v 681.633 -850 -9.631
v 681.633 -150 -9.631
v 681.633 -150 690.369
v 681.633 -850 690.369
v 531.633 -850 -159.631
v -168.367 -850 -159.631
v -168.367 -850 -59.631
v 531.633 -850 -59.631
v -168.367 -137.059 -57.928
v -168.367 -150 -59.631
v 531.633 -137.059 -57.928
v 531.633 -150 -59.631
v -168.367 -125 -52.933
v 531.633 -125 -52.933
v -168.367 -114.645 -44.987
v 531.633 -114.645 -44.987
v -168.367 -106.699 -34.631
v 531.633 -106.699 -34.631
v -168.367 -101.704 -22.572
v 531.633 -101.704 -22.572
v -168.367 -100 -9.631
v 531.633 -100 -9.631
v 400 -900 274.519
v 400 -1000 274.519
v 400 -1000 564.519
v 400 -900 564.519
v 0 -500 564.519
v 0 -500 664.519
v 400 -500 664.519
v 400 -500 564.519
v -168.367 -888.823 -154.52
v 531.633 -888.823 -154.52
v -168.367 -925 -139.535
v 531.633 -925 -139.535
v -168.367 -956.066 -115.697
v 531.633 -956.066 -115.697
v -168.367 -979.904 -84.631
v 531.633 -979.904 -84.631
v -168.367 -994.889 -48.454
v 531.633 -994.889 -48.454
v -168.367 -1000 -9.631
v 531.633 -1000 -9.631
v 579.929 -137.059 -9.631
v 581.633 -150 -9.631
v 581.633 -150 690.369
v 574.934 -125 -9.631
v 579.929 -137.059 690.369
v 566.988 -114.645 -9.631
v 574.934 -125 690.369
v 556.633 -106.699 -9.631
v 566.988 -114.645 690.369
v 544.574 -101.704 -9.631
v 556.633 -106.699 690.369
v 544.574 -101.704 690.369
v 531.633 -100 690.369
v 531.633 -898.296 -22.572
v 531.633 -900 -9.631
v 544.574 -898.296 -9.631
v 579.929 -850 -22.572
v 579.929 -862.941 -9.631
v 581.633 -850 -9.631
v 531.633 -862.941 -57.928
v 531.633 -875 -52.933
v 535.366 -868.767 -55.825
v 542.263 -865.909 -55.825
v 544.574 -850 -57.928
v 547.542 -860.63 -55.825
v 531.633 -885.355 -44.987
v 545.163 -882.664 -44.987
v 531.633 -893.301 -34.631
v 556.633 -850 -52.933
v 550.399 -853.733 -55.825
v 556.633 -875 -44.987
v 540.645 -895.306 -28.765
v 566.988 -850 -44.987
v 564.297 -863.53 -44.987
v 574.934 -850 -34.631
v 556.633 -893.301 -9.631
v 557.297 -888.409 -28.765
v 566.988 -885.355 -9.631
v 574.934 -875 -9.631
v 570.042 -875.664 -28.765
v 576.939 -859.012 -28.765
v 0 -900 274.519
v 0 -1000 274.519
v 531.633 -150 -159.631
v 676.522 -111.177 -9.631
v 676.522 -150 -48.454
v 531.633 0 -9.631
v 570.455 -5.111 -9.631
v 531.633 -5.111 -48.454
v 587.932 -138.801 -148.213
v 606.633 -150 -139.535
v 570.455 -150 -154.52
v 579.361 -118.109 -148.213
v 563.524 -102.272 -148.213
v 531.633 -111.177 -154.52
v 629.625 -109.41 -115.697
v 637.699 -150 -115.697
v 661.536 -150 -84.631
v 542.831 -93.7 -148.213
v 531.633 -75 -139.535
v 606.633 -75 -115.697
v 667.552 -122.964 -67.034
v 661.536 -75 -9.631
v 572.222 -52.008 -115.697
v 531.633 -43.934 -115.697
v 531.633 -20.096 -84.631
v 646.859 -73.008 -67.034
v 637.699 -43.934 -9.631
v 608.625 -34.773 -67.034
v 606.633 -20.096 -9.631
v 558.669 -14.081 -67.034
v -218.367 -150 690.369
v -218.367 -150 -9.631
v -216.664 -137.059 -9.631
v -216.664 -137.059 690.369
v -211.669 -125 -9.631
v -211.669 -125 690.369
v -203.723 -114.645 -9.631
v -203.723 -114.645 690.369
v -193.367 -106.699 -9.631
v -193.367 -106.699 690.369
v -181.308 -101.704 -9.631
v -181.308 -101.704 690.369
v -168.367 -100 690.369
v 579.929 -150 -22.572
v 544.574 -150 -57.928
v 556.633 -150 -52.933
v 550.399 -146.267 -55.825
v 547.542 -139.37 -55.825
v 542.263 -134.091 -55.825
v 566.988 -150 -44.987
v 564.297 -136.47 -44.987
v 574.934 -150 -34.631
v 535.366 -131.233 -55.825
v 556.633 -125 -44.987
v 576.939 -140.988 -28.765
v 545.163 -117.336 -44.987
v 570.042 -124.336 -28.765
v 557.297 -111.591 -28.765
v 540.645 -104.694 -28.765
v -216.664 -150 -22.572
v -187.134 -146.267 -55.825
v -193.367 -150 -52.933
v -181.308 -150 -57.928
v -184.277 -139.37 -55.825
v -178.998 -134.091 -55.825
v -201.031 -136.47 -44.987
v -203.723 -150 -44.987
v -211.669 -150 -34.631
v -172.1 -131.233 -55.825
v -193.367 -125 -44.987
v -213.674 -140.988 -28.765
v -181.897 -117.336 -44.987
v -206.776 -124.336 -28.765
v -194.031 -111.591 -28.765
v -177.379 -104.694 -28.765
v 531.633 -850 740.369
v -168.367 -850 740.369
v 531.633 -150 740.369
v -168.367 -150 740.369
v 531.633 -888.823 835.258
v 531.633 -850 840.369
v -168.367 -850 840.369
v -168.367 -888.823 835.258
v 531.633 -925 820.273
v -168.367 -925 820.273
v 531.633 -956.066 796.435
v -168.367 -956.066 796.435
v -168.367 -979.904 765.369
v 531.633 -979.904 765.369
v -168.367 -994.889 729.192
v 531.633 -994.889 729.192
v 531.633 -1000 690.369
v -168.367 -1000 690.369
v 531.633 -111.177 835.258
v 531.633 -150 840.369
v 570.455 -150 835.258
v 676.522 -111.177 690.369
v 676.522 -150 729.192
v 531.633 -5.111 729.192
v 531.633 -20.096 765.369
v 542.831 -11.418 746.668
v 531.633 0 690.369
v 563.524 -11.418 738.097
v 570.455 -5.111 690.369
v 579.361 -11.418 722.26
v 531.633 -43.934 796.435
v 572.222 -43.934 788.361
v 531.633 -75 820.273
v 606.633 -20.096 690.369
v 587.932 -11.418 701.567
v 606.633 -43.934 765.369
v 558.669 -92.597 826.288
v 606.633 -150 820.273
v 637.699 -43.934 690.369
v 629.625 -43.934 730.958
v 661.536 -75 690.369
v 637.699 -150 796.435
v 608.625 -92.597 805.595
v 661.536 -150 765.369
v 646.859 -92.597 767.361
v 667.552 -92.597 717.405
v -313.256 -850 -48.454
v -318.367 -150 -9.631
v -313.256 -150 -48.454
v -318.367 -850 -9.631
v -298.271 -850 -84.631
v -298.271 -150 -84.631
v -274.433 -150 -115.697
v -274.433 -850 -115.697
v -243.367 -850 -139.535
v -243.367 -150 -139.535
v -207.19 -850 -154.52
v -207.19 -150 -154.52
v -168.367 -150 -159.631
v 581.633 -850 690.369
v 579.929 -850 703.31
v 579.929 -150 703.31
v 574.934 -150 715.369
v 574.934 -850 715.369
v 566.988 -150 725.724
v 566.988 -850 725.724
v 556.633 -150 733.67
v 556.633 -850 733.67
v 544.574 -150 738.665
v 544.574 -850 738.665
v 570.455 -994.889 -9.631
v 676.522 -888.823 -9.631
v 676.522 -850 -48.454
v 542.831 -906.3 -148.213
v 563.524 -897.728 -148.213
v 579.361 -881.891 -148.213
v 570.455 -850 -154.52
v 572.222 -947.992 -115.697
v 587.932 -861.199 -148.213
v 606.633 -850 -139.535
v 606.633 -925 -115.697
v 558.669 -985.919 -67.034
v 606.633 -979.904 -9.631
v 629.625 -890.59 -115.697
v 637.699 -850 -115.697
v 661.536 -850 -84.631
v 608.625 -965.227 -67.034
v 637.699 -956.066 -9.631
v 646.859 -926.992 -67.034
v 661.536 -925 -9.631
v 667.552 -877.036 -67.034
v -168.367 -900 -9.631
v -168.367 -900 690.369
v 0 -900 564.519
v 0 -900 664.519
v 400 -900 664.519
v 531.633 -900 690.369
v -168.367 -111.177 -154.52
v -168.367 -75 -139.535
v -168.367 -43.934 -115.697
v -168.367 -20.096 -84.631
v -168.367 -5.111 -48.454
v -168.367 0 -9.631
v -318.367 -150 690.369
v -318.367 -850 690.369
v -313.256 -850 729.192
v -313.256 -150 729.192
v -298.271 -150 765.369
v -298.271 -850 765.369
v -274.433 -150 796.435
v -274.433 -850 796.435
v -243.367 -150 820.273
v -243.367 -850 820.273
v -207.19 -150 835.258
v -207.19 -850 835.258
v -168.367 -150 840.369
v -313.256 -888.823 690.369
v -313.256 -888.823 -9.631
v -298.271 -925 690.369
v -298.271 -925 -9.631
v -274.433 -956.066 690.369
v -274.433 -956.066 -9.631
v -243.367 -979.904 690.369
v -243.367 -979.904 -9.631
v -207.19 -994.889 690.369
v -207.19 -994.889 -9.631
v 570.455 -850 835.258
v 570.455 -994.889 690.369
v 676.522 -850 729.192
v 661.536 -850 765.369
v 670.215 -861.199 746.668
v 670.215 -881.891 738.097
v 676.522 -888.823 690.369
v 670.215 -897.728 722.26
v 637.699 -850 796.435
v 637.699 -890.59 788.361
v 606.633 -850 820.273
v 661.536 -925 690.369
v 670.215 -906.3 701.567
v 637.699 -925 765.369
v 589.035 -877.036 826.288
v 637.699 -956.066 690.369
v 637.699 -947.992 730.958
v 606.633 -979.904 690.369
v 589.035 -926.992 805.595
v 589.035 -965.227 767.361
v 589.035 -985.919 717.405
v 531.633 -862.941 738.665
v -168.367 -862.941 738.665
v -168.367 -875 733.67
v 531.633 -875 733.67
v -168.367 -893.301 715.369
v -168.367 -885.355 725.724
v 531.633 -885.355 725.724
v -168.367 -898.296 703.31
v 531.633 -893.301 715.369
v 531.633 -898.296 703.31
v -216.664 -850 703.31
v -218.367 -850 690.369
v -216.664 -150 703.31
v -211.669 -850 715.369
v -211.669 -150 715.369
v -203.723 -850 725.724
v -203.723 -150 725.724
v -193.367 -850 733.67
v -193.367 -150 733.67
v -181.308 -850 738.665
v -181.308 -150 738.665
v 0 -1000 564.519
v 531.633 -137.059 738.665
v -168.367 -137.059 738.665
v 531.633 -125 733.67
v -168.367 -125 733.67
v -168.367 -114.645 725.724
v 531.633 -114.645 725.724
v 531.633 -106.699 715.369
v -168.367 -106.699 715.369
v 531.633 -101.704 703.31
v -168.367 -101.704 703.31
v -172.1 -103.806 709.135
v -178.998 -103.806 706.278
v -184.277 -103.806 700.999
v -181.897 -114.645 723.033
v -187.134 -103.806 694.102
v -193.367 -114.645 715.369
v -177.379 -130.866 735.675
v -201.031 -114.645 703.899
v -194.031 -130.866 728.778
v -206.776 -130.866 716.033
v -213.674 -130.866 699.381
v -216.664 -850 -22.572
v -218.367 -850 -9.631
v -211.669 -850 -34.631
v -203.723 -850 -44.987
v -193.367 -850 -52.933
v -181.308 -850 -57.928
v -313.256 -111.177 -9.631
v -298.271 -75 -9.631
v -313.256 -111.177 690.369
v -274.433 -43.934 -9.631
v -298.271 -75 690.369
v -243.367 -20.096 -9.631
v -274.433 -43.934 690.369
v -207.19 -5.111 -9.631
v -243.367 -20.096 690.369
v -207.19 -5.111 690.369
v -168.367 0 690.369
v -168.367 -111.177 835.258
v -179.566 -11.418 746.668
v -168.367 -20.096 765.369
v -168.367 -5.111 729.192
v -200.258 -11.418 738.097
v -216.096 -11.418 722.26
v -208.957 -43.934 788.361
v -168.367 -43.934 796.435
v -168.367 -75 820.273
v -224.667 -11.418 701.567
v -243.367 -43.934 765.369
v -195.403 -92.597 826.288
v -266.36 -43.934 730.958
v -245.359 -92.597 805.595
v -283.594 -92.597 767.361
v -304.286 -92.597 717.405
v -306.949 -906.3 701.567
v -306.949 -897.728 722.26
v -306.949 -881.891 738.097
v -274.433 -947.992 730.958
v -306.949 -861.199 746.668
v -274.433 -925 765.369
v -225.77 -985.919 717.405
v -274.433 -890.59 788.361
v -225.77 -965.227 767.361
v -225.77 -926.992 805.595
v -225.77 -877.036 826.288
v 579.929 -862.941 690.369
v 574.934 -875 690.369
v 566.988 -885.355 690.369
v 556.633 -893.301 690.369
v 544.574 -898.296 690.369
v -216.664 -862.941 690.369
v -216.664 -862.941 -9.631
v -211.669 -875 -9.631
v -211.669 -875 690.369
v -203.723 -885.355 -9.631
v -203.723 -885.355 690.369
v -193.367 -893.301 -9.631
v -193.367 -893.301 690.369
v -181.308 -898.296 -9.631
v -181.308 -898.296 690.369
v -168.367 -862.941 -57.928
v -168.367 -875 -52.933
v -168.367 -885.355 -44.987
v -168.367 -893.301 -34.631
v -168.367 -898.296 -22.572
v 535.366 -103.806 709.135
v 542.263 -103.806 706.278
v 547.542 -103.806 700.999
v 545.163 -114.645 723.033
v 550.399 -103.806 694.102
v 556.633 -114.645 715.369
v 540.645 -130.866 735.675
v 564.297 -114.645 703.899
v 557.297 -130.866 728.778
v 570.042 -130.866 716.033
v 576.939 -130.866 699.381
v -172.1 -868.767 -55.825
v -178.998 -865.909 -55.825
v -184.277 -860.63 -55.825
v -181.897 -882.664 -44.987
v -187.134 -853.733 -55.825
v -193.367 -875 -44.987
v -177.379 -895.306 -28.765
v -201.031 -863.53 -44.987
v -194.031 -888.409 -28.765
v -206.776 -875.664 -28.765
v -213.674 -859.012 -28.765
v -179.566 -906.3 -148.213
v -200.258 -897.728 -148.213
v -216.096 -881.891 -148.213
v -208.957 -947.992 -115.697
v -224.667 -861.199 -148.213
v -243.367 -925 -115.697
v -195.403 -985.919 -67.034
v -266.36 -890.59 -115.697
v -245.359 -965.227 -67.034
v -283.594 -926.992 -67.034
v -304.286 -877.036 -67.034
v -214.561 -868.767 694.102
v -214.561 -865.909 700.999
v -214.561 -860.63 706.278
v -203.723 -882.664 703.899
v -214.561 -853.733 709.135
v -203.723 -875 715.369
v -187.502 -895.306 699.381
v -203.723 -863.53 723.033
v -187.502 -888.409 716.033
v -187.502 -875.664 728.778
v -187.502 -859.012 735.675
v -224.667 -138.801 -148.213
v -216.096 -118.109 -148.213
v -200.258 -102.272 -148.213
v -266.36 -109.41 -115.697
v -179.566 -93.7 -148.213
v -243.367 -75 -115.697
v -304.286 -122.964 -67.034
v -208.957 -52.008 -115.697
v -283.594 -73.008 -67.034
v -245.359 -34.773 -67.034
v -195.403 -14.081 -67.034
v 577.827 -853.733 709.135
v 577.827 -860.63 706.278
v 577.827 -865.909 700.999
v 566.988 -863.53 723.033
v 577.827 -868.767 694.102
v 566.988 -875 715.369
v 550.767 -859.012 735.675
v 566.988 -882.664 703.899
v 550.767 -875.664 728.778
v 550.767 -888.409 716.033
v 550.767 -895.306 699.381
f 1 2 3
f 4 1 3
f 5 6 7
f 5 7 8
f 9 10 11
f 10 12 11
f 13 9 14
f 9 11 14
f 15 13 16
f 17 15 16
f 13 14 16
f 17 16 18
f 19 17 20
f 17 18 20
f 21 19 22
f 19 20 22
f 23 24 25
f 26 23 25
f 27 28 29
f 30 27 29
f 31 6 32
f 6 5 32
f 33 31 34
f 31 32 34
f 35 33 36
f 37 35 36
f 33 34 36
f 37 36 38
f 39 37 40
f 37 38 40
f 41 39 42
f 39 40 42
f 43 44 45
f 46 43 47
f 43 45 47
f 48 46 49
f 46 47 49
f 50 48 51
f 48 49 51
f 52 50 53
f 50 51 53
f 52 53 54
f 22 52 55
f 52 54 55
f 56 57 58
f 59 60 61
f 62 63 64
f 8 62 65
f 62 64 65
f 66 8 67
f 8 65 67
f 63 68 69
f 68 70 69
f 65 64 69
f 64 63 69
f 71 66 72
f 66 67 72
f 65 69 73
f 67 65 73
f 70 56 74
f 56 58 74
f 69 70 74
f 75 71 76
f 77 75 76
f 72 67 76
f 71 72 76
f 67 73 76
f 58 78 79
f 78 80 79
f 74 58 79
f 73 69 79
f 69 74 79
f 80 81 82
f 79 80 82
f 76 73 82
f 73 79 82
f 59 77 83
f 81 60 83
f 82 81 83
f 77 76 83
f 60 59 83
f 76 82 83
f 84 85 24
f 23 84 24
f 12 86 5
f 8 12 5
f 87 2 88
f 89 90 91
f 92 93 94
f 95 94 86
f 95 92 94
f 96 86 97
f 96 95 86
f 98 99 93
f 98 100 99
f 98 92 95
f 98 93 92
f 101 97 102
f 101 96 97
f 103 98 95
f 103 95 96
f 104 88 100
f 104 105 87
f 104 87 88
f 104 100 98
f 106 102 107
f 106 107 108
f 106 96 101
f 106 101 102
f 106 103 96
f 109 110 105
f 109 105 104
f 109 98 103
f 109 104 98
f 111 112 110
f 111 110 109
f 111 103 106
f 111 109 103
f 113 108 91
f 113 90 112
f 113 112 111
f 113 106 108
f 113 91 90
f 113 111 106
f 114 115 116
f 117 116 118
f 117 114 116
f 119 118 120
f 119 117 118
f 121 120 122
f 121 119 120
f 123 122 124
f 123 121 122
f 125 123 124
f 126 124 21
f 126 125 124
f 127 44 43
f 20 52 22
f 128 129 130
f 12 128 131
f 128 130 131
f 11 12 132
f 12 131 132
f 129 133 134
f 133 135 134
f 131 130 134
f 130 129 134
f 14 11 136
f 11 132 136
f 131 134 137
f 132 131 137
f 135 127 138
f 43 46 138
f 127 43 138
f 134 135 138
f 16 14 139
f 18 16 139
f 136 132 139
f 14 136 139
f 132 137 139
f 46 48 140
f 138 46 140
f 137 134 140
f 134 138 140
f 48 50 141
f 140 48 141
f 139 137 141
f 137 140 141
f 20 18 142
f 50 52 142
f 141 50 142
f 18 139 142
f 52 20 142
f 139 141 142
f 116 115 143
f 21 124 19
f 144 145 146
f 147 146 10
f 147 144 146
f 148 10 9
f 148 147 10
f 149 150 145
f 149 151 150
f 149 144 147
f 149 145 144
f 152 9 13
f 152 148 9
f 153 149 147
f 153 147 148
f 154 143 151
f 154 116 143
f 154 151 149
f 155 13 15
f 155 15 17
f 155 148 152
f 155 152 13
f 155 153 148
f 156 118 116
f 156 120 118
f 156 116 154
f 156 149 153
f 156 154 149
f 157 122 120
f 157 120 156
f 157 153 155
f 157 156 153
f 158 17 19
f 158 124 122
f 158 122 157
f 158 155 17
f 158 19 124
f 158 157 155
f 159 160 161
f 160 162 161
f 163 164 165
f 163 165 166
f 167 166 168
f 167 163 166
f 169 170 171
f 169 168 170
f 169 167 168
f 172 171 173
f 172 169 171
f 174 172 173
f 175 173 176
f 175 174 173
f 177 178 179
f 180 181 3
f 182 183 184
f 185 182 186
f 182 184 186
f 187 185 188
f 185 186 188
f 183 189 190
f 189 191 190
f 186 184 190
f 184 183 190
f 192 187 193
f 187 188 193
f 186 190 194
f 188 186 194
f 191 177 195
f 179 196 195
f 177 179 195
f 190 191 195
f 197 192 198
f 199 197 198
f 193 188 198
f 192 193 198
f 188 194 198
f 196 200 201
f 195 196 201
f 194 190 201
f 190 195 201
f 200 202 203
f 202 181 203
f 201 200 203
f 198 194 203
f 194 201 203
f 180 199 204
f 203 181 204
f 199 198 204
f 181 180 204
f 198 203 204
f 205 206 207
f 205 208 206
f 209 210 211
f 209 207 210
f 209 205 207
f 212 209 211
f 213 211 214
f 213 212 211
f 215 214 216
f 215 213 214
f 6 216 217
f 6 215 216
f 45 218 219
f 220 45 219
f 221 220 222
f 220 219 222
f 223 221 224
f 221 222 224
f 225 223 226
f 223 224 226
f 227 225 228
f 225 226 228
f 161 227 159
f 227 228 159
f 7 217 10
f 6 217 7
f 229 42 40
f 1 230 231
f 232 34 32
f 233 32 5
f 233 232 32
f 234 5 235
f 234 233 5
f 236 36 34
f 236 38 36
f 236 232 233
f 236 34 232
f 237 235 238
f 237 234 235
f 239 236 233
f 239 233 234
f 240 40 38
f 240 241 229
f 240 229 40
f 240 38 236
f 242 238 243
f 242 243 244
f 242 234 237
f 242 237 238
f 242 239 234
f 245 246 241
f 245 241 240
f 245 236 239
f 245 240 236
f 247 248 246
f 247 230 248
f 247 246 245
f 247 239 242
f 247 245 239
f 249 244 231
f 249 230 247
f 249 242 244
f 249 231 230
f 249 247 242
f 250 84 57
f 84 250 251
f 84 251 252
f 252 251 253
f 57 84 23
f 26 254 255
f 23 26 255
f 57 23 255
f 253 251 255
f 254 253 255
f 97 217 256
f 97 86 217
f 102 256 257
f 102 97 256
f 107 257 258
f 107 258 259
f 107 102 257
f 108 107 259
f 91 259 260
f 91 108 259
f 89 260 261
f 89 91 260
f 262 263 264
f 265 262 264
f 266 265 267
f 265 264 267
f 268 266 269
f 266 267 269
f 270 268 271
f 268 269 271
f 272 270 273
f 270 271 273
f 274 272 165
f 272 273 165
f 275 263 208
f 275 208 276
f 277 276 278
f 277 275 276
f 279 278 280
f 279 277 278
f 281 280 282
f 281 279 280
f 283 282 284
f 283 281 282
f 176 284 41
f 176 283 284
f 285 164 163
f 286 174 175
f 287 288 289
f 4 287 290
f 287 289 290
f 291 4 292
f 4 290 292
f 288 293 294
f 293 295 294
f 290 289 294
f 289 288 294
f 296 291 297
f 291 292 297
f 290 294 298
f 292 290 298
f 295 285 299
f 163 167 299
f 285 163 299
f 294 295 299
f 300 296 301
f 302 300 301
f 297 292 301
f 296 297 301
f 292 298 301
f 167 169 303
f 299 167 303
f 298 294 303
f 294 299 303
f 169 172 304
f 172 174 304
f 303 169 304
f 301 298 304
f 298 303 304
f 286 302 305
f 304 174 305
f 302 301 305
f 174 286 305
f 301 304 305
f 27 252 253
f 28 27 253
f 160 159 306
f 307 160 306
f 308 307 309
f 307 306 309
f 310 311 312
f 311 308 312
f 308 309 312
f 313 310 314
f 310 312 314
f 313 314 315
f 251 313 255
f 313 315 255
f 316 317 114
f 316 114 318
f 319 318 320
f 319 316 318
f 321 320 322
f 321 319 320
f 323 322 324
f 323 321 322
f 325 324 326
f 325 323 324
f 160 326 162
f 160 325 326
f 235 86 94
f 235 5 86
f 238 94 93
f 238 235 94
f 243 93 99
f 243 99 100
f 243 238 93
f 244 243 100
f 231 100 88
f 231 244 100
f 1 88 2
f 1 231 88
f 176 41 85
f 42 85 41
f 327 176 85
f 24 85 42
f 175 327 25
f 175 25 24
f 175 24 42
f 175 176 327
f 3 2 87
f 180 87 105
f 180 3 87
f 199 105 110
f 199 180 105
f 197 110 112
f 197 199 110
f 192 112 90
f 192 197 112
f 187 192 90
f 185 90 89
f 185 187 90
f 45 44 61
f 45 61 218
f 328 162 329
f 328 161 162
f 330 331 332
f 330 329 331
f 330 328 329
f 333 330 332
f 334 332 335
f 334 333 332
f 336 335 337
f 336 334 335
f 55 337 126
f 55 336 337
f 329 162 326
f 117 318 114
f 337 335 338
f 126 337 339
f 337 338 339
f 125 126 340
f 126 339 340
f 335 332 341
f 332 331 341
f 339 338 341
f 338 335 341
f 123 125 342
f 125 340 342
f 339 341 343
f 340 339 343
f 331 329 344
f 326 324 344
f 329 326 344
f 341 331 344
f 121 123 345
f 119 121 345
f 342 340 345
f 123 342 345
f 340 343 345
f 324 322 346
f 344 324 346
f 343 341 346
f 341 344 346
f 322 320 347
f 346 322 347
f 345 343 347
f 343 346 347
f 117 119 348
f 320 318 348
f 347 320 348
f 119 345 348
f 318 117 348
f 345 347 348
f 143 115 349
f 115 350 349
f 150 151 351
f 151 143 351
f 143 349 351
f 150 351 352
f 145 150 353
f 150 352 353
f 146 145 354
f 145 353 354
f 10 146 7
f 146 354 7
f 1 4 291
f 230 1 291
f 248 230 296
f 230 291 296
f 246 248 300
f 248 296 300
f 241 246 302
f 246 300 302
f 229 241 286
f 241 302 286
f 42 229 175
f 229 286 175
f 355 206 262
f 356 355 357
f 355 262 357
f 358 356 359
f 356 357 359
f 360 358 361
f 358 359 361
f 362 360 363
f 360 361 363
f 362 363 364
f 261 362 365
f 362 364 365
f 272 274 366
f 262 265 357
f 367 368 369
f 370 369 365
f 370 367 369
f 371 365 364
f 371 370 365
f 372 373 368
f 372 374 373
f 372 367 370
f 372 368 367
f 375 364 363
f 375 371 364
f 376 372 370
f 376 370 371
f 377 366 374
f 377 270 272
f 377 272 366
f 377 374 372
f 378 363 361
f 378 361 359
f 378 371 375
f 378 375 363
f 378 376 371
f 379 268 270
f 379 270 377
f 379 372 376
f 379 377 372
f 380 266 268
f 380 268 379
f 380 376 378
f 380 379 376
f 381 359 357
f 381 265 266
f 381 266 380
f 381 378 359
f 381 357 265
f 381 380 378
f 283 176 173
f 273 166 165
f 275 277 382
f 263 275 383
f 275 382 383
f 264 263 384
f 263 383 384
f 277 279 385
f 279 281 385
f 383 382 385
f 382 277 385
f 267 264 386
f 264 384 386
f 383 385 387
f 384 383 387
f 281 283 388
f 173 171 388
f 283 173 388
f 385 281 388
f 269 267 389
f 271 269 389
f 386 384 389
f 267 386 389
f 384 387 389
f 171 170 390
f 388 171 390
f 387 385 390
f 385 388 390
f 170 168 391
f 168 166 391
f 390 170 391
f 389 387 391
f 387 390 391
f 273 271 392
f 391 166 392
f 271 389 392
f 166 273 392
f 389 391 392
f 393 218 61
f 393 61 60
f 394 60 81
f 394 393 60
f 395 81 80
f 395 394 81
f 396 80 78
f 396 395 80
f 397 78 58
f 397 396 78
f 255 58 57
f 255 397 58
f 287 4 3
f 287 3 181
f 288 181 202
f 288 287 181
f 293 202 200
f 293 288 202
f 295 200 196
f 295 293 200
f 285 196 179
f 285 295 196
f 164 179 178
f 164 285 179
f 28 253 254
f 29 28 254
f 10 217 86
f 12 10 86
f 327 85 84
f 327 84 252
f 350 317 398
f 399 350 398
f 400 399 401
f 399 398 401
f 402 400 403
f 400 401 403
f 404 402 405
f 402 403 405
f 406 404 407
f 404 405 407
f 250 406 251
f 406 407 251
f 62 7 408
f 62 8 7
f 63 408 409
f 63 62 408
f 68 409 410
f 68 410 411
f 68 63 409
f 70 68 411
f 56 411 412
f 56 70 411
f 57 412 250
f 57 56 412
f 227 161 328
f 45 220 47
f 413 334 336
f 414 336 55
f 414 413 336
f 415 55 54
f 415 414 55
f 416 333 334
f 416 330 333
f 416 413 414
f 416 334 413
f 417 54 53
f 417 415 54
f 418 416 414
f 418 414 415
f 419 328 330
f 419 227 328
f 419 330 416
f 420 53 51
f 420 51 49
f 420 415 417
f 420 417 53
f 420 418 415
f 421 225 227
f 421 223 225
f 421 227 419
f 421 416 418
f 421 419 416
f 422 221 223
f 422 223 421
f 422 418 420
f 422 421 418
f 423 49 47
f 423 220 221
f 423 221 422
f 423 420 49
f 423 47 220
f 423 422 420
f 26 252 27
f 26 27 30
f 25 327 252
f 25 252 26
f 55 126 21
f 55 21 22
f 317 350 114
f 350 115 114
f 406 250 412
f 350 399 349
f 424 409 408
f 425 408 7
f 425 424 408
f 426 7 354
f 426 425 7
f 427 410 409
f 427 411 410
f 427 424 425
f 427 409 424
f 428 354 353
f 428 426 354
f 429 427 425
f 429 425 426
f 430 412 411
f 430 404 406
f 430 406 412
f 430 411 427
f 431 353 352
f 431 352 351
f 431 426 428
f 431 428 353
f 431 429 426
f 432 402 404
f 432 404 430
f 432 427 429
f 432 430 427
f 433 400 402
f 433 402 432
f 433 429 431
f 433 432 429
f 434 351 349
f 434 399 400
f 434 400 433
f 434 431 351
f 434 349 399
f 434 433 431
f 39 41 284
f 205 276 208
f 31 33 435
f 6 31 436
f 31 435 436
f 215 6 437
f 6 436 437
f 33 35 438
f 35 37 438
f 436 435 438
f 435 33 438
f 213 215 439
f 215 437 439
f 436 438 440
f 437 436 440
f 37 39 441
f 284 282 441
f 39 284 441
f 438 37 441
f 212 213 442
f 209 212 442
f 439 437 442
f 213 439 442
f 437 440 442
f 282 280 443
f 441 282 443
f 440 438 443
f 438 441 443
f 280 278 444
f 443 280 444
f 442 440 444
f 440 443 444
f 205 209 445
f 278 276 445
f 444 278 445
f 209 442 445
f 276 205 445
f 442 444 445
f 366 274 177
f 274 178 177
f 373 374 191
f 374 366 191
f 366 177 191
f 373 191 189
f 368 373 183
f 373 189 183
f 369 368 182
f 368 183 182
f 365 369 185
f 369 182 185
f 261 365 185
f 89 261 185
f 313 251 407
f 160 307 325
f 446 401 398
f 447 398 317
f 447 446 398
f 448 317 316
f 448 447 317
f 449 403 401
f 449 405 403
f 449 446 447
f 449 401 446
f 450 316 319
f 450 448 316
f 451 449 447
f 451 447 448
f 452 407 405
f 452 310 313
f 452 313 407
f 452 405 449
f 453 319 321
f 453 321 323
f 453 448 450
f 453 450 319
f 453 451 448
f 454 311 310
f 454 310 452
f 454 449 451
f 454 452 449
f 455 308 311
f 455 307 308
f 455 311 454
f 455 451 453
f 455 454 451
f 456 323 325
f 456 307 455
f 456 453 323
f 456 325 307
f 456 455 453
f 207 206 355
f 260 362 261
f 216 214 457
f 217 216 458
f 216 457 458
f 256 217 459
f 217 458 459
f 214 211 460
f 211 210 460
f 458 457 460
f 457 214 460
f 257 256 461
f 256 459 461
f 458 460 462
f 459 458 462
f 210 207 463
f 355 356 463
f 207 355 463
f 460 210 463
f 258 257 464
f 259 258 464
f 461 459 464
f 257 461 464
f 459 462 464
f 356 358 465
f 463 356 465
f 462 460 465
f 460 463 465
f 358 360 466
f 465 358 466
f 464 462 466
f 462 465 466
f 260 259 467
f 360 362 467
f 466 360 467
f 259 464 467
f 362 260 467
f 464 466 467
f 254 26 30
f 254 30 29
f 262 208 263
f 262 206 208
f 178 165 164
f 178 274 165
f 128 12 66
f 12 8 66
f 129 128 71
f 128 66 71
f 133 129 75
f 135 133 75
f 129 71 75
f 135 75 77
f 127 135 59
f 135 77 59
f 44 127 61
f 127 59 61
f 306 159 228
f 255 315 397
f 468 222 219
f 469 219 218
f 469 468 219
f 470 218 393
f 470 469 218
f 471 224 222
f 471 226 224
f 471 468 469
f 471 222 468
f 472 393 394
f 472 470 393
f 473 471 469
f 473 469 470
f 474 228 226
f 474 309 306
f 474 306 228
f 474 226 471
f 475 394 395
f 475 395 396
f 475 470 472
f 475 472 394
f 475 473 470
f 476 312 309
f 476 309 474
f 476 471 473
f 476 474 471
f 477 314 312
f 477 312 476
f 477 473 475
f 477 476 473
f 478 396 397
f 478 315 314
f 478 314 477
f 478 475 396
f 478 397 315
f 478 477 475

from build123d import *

# Parameters (mm, degrees)
F0_W     = 1000
F0_H     = 1000
F1_DEPTH = 1000
F2_R     = 150
F3_W     = 400
F3_H     = 290
F4_DEPTH = 500
F5_T     = 100
F6_W     = 700
F6_H     = 700
F7_DEPTH = 500


# Not quite as in the source:
# - a shell that OpenCascade refuses in one call is made with other operations: the cavity is built on its own and cut out


with BuildPart() as f1:
    # F0 (on Front) → F1 (new body)
    with BuildSketch(Plane.XZ):
        with Locations((181.6326389278, 340.3687052429)):
            Rectangle(F0_W, F0_H)
    extrude(amount=F1_DEPTH)

    # F2
    f2_edges = [f1.edges().sort_by_distance(p)[0] for p in [
        (181.632639, -1000, 840.368705),
        (681.632639, -500, 840.368705),
        (681.632639, -1000, 340.368705),
        (-318.367361, -1000, 340.368705),
        (-318.367361, -500, 840.368705),
        (181.632639, 0, 840.368705),
        (681.632639, 0, 340.368705),
        (-318.367361, 0, 340.368705),
        (181.632639, -1000, -159.631295),
        (681.632639, -500, -159.631295),
        (-318.367361, -500, -159.631295),
        (181.632639, 0, -159.631295),
    ]]
    fillet(f2_edges, radius=F2_R)

    # F3 (on face) → F4 (cut)
    with BuildSketch(Plane.XZ.offset(1000)):
        with Locations((200, 419.5188772678)):
            Rectangle(F3_W, F3_H)
    extrude(amount=-F4_DEPTH, mode=Mode.SUBTRACT)

    # F5: shell of thickness 100, made by hand


with BuildPart() as f5_core1:
    # F5_t2: copy of F1
    add(f1.part)

    # the walls: a layer under each face that stays
    f5_faces = [f5_core1.faces().sort_by_distance(p)[0] for p in [
        (-318.3673610722, -500, 340.3687052429),
        (-274.4333782502, -956.066017178, 340.3687052429),
        (-274.4333782502, -500, 796.4347224209),
        (-274.4333782502, -500, -115.6973119351),
        (-274.4333782502, -43.933982822, 340.3687052429),
        (-274.4333782502, -925, 765.3687052429),
        (-51.7006944055, -1000, 107.0353719095),
        (-243.3673610722, -925, -115.6973119351),
        (-243.3673610722, -43.933982822, 765.3687052429),
        (181.6326389278, -500, 840.3687052429),
        (-243.3673610722, -75, -115.6973119351),
        (181.6326389278, -500, -159.6312947571),
        (181.6326389278, 0, 340.3687052429),
        (181.6326389278, -956.066017178, 796.4347224209),
        (637.6986561058, -956.066017178, 340.3687052429),
        (181.6326389278, -956.066017178, -115.6973119351),
        (200, -750, 564.5188772678),
        (181.6326389278, -43.933982822, 796.4347224209),
        (637.6986561058, -500, 796.4347224209),
        (181.6326389278, -43.933982822, -115.6973119351),
        (637.6986561058, -500, -115.6973119351),
        (637.6986561058, -43.933982822, 340.3687052429),
        (637.6986561058, -925, 765.3687052429),
        (681.6326389278, -500, 340.3687052429),
        (606.6326389278, -925, -115.6973119351),
        (606.6326389278, -43.933982822, 765.3687052429),
        (606.6326389278, -75, -115.6973119351),
    ]]
    thicken(f5_faces, amount=-F5_T, mode=Mode.SUBTRACT)


with BuildPart() as f1_1:
    add(f1.part)

    # what is left inside the walls is the cavity
    f5_cavity = [f5_core1.part.solids().sort_by_distance(p)[0] for p in [
        (181.632639, -101, 223.702039),
    ]]
    add(f5_cavity, mode=Mode.SUBTRACT)

    # F6 (on face) → F7 (cut)
    with BuildSketch(Plane(origin=(0, 0, -159.6312947571), x_dir=(1, 0, 0), z_dir=(0, 0, -1))):
        with Locations((181.6326389278, 500)):
            Rectangle(F6_W, F6_H)
    extrude(amount=-F7_DEPTH, mode=Mode.SUBTRACT)


solid = f1_1.part
